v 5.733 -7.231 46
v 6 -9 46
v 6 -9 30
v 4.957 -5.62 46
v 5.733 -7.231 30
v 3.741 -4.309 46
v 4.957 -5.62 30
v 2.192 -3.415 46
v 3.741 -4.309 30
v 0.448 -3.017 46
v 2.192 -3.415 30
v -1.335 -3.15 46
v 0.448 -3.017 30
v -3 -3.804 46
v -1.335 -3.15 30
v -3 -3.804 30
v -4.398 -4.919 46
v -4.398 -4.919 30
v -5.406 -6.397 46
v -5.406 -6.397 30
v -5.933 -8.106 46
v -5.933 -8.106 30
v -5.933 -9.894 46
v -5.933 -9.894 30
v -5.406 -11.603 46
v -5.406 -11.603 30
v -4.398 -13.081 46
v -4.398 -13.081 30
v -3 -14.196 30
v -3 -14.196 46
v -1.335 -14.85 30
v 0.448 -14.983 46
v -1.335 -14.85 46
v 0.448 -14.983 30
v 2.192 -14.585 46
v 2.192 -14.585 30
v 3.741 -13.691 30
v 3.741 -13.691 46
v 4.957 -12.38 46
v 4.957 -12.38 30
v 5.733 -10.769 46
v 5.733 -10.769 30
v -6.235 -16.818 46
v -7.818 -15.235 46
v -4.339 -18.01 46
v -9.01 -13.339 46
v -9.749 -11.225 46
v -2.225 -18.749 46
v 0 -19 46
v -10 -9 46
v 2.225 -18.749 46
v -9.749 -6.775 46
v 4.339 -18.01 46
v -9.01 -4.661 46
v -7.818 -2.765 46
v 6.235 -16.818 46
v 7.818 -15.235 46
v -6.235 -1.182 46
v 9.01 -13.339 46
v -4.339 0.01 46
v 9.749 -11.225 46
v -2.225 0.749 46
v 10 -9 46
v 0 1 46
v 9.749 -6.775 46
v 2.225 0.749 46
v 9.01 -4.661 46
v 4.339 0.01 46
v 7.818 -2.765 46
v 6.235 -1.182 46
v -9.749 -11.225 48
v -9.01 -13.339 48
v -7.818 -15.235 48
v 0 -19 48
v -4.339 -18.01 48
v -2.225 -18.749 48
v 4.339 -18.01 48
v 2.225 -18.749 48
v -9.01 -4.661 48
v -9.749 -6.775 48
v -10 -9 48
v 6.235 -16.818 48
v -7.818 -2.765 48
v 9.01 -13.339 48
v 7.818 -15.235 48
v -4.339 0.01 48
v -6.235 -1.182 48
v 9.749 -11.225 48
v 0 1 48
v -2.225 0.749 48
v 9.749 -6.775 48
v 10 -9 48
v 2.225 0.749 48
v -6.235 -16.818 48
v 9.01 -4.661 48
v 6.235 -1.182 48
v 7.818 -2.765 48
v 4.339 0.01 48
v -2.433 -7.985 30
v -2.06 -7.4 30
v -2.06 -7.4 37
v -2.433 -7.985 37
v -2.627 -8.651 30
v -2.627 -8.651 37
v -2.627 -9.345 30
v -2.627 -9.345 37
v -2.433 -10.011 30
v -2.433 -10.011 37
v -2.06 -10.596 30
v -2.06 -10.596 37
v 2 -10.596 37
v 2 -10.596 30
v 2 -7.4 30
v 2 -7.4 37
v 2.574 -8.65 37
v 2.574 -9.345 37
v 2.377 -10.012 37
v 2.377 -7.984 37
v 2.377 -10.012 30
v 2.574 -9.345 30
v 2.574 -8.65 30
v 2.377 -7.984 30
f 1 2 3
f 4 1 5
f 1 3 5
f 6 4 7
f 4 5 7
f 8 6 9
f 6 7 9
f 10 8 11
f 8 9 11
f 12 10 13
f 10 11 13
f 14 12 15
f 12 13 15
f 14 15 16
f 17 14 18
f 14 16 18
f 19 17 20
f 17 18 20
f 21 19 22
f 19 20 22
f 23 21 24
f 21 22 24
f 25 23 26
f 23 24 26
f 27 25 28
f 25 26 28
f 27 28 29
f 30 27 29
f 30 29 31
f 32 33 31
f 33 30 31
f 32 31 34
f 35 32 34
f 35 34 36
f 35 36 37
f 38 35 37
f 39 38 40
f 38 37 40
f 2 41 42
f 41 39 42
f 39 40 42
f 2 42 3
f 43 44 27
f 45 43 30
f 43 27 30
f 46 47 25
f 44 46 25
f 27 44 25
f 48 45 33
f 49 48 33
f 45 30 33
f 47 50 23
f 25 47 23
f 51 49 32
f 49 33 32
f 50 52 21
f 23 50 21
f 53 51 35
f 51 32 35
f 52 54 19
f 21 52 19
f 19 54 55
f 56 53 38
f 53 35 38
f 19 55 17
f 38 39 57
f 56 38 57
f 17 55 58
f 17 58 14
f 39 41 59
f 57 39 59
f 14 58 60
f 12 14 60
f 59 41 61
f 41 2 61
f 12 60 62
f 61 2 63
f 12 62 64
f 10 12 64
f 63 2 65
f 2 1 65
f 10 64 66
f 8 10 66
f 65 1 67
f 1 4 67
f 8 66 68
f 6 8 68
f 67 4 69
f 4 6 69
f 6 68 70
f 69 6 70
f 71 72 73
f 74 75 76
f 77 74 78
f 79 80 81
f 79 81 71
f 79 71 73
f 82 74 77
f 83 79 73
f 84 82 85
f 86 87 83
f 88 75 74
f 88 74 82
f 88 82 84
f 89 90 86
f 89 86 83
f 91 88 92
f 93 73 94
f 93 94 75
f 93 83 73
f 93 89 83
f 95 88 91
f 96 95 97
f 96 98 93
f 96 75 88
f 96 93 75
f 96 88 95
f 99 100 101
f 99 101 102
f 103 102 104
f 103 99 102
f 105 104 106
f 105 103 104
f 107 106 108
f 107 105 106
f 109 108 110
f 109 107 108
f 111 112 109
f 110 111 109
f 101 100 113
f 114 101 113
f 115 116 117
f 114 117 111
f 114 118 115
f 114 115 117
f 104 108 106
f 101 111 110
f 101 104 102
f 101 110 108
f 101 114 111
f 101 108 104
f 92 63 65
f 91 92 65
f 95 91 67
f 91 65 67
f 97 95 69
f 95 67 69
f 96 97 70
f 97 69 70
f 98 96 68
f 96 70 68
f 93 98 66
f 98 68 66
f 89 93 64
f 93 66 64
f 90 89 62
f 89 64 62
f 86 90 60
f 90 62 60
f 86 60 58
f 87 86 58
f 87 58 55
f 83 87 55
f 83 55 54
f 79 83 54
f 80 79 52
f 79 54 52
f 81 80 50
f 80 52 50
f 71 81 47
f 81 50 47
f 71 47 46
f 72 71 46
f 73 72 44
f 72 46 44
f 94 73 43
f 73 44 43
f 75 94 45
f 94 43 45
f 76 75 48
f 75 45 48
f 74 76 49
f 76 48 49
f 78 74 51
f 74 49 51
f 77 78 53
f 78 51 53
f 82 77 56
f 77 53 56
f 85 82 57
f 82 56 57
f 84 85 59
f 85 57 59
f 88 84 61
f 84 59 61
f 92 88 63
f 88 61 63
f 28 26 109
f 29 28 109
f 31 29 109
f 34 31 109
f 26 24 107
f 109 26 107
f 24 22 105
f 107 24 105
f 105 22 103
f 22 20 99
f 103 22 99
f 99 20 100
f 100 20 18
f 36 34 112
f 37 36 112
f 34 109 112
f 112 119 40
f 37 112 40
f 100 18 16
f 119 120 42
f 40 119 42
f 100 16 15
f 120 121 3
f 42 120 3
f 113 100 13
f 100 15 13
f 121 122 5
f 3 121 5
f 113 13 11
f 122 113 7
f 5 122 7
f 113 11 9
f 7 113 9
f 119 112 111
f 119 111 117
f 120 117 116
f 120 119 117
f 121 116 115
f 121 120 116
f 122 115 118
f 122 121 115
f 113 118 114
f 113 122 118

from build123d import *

# Parameters (mm, degrees)
EXTRUDE002_DEPTH  = 7
CYLINDER006_R     = 6
CYLINDER006_DEPTH = 17
CYLINDER_R        = 10
CYLINDER_DEPTH    = 2


with BuildPart() as extrude002:
    # Sketch → Extrude002 (new body)
    with BuildSketch(Plane.XY):
        with BuildLine():
            Line((-2.060088, 8.599999), (2.000001, 8.599999))
            ThreePointArc((2.000001, 5.404159), (2.598634, 7.002079), (2.000001, 8.599999))
            Line((2.000001, 5.404159), (-2.060088, 5.404159))
            ThreePointArc((-2.060088, 8.599999), (-2.651924, 7.002079), (-2.060088, 5.404159))
        make_face()
    extrude(amount=EXTRUDE002_DEPTH)


with BuildPart() as extrude002_1:
    # Extrude002 placement: moved
    add(extrude002.part.moved(Location((-1, 18, 24))))


with BuildPart() as cut015:
    # Cylinder006 → Cylinder006 (new body)
    with BuildSketch(Plane(origin=(-1, 25, 24), x_dir=(1, 0, 0), z_dir=(0, 0, 1))):
        Circle(CYLINDER006_R)
    extrude(amount=CYLINDER006_DEPTH)

    # Cut015: cut Extrude002
    add(extrude002_1.part, mode=Mode.SUBTRACT)


with BuildPart() as acoclador:
    # Cylinder → Cylinder (new body)
    with BuildSketch(Plane(origin=(-1, 25, 40), x_dir=(1, 0, 0), z_dir=(0, 0, 1))):
        Circle(CYLINDER_R)
    extrude(amount=CYLINDER_DEPTH)

    # Fusion014: union Cut015
    add(cut015.part)


with BuildPart() as acoclador_1:
    # Fusion014 placement: moved
    add(acoclador.part.moved(Location((1, -34, 6))))


solid = acoclador_1.part
